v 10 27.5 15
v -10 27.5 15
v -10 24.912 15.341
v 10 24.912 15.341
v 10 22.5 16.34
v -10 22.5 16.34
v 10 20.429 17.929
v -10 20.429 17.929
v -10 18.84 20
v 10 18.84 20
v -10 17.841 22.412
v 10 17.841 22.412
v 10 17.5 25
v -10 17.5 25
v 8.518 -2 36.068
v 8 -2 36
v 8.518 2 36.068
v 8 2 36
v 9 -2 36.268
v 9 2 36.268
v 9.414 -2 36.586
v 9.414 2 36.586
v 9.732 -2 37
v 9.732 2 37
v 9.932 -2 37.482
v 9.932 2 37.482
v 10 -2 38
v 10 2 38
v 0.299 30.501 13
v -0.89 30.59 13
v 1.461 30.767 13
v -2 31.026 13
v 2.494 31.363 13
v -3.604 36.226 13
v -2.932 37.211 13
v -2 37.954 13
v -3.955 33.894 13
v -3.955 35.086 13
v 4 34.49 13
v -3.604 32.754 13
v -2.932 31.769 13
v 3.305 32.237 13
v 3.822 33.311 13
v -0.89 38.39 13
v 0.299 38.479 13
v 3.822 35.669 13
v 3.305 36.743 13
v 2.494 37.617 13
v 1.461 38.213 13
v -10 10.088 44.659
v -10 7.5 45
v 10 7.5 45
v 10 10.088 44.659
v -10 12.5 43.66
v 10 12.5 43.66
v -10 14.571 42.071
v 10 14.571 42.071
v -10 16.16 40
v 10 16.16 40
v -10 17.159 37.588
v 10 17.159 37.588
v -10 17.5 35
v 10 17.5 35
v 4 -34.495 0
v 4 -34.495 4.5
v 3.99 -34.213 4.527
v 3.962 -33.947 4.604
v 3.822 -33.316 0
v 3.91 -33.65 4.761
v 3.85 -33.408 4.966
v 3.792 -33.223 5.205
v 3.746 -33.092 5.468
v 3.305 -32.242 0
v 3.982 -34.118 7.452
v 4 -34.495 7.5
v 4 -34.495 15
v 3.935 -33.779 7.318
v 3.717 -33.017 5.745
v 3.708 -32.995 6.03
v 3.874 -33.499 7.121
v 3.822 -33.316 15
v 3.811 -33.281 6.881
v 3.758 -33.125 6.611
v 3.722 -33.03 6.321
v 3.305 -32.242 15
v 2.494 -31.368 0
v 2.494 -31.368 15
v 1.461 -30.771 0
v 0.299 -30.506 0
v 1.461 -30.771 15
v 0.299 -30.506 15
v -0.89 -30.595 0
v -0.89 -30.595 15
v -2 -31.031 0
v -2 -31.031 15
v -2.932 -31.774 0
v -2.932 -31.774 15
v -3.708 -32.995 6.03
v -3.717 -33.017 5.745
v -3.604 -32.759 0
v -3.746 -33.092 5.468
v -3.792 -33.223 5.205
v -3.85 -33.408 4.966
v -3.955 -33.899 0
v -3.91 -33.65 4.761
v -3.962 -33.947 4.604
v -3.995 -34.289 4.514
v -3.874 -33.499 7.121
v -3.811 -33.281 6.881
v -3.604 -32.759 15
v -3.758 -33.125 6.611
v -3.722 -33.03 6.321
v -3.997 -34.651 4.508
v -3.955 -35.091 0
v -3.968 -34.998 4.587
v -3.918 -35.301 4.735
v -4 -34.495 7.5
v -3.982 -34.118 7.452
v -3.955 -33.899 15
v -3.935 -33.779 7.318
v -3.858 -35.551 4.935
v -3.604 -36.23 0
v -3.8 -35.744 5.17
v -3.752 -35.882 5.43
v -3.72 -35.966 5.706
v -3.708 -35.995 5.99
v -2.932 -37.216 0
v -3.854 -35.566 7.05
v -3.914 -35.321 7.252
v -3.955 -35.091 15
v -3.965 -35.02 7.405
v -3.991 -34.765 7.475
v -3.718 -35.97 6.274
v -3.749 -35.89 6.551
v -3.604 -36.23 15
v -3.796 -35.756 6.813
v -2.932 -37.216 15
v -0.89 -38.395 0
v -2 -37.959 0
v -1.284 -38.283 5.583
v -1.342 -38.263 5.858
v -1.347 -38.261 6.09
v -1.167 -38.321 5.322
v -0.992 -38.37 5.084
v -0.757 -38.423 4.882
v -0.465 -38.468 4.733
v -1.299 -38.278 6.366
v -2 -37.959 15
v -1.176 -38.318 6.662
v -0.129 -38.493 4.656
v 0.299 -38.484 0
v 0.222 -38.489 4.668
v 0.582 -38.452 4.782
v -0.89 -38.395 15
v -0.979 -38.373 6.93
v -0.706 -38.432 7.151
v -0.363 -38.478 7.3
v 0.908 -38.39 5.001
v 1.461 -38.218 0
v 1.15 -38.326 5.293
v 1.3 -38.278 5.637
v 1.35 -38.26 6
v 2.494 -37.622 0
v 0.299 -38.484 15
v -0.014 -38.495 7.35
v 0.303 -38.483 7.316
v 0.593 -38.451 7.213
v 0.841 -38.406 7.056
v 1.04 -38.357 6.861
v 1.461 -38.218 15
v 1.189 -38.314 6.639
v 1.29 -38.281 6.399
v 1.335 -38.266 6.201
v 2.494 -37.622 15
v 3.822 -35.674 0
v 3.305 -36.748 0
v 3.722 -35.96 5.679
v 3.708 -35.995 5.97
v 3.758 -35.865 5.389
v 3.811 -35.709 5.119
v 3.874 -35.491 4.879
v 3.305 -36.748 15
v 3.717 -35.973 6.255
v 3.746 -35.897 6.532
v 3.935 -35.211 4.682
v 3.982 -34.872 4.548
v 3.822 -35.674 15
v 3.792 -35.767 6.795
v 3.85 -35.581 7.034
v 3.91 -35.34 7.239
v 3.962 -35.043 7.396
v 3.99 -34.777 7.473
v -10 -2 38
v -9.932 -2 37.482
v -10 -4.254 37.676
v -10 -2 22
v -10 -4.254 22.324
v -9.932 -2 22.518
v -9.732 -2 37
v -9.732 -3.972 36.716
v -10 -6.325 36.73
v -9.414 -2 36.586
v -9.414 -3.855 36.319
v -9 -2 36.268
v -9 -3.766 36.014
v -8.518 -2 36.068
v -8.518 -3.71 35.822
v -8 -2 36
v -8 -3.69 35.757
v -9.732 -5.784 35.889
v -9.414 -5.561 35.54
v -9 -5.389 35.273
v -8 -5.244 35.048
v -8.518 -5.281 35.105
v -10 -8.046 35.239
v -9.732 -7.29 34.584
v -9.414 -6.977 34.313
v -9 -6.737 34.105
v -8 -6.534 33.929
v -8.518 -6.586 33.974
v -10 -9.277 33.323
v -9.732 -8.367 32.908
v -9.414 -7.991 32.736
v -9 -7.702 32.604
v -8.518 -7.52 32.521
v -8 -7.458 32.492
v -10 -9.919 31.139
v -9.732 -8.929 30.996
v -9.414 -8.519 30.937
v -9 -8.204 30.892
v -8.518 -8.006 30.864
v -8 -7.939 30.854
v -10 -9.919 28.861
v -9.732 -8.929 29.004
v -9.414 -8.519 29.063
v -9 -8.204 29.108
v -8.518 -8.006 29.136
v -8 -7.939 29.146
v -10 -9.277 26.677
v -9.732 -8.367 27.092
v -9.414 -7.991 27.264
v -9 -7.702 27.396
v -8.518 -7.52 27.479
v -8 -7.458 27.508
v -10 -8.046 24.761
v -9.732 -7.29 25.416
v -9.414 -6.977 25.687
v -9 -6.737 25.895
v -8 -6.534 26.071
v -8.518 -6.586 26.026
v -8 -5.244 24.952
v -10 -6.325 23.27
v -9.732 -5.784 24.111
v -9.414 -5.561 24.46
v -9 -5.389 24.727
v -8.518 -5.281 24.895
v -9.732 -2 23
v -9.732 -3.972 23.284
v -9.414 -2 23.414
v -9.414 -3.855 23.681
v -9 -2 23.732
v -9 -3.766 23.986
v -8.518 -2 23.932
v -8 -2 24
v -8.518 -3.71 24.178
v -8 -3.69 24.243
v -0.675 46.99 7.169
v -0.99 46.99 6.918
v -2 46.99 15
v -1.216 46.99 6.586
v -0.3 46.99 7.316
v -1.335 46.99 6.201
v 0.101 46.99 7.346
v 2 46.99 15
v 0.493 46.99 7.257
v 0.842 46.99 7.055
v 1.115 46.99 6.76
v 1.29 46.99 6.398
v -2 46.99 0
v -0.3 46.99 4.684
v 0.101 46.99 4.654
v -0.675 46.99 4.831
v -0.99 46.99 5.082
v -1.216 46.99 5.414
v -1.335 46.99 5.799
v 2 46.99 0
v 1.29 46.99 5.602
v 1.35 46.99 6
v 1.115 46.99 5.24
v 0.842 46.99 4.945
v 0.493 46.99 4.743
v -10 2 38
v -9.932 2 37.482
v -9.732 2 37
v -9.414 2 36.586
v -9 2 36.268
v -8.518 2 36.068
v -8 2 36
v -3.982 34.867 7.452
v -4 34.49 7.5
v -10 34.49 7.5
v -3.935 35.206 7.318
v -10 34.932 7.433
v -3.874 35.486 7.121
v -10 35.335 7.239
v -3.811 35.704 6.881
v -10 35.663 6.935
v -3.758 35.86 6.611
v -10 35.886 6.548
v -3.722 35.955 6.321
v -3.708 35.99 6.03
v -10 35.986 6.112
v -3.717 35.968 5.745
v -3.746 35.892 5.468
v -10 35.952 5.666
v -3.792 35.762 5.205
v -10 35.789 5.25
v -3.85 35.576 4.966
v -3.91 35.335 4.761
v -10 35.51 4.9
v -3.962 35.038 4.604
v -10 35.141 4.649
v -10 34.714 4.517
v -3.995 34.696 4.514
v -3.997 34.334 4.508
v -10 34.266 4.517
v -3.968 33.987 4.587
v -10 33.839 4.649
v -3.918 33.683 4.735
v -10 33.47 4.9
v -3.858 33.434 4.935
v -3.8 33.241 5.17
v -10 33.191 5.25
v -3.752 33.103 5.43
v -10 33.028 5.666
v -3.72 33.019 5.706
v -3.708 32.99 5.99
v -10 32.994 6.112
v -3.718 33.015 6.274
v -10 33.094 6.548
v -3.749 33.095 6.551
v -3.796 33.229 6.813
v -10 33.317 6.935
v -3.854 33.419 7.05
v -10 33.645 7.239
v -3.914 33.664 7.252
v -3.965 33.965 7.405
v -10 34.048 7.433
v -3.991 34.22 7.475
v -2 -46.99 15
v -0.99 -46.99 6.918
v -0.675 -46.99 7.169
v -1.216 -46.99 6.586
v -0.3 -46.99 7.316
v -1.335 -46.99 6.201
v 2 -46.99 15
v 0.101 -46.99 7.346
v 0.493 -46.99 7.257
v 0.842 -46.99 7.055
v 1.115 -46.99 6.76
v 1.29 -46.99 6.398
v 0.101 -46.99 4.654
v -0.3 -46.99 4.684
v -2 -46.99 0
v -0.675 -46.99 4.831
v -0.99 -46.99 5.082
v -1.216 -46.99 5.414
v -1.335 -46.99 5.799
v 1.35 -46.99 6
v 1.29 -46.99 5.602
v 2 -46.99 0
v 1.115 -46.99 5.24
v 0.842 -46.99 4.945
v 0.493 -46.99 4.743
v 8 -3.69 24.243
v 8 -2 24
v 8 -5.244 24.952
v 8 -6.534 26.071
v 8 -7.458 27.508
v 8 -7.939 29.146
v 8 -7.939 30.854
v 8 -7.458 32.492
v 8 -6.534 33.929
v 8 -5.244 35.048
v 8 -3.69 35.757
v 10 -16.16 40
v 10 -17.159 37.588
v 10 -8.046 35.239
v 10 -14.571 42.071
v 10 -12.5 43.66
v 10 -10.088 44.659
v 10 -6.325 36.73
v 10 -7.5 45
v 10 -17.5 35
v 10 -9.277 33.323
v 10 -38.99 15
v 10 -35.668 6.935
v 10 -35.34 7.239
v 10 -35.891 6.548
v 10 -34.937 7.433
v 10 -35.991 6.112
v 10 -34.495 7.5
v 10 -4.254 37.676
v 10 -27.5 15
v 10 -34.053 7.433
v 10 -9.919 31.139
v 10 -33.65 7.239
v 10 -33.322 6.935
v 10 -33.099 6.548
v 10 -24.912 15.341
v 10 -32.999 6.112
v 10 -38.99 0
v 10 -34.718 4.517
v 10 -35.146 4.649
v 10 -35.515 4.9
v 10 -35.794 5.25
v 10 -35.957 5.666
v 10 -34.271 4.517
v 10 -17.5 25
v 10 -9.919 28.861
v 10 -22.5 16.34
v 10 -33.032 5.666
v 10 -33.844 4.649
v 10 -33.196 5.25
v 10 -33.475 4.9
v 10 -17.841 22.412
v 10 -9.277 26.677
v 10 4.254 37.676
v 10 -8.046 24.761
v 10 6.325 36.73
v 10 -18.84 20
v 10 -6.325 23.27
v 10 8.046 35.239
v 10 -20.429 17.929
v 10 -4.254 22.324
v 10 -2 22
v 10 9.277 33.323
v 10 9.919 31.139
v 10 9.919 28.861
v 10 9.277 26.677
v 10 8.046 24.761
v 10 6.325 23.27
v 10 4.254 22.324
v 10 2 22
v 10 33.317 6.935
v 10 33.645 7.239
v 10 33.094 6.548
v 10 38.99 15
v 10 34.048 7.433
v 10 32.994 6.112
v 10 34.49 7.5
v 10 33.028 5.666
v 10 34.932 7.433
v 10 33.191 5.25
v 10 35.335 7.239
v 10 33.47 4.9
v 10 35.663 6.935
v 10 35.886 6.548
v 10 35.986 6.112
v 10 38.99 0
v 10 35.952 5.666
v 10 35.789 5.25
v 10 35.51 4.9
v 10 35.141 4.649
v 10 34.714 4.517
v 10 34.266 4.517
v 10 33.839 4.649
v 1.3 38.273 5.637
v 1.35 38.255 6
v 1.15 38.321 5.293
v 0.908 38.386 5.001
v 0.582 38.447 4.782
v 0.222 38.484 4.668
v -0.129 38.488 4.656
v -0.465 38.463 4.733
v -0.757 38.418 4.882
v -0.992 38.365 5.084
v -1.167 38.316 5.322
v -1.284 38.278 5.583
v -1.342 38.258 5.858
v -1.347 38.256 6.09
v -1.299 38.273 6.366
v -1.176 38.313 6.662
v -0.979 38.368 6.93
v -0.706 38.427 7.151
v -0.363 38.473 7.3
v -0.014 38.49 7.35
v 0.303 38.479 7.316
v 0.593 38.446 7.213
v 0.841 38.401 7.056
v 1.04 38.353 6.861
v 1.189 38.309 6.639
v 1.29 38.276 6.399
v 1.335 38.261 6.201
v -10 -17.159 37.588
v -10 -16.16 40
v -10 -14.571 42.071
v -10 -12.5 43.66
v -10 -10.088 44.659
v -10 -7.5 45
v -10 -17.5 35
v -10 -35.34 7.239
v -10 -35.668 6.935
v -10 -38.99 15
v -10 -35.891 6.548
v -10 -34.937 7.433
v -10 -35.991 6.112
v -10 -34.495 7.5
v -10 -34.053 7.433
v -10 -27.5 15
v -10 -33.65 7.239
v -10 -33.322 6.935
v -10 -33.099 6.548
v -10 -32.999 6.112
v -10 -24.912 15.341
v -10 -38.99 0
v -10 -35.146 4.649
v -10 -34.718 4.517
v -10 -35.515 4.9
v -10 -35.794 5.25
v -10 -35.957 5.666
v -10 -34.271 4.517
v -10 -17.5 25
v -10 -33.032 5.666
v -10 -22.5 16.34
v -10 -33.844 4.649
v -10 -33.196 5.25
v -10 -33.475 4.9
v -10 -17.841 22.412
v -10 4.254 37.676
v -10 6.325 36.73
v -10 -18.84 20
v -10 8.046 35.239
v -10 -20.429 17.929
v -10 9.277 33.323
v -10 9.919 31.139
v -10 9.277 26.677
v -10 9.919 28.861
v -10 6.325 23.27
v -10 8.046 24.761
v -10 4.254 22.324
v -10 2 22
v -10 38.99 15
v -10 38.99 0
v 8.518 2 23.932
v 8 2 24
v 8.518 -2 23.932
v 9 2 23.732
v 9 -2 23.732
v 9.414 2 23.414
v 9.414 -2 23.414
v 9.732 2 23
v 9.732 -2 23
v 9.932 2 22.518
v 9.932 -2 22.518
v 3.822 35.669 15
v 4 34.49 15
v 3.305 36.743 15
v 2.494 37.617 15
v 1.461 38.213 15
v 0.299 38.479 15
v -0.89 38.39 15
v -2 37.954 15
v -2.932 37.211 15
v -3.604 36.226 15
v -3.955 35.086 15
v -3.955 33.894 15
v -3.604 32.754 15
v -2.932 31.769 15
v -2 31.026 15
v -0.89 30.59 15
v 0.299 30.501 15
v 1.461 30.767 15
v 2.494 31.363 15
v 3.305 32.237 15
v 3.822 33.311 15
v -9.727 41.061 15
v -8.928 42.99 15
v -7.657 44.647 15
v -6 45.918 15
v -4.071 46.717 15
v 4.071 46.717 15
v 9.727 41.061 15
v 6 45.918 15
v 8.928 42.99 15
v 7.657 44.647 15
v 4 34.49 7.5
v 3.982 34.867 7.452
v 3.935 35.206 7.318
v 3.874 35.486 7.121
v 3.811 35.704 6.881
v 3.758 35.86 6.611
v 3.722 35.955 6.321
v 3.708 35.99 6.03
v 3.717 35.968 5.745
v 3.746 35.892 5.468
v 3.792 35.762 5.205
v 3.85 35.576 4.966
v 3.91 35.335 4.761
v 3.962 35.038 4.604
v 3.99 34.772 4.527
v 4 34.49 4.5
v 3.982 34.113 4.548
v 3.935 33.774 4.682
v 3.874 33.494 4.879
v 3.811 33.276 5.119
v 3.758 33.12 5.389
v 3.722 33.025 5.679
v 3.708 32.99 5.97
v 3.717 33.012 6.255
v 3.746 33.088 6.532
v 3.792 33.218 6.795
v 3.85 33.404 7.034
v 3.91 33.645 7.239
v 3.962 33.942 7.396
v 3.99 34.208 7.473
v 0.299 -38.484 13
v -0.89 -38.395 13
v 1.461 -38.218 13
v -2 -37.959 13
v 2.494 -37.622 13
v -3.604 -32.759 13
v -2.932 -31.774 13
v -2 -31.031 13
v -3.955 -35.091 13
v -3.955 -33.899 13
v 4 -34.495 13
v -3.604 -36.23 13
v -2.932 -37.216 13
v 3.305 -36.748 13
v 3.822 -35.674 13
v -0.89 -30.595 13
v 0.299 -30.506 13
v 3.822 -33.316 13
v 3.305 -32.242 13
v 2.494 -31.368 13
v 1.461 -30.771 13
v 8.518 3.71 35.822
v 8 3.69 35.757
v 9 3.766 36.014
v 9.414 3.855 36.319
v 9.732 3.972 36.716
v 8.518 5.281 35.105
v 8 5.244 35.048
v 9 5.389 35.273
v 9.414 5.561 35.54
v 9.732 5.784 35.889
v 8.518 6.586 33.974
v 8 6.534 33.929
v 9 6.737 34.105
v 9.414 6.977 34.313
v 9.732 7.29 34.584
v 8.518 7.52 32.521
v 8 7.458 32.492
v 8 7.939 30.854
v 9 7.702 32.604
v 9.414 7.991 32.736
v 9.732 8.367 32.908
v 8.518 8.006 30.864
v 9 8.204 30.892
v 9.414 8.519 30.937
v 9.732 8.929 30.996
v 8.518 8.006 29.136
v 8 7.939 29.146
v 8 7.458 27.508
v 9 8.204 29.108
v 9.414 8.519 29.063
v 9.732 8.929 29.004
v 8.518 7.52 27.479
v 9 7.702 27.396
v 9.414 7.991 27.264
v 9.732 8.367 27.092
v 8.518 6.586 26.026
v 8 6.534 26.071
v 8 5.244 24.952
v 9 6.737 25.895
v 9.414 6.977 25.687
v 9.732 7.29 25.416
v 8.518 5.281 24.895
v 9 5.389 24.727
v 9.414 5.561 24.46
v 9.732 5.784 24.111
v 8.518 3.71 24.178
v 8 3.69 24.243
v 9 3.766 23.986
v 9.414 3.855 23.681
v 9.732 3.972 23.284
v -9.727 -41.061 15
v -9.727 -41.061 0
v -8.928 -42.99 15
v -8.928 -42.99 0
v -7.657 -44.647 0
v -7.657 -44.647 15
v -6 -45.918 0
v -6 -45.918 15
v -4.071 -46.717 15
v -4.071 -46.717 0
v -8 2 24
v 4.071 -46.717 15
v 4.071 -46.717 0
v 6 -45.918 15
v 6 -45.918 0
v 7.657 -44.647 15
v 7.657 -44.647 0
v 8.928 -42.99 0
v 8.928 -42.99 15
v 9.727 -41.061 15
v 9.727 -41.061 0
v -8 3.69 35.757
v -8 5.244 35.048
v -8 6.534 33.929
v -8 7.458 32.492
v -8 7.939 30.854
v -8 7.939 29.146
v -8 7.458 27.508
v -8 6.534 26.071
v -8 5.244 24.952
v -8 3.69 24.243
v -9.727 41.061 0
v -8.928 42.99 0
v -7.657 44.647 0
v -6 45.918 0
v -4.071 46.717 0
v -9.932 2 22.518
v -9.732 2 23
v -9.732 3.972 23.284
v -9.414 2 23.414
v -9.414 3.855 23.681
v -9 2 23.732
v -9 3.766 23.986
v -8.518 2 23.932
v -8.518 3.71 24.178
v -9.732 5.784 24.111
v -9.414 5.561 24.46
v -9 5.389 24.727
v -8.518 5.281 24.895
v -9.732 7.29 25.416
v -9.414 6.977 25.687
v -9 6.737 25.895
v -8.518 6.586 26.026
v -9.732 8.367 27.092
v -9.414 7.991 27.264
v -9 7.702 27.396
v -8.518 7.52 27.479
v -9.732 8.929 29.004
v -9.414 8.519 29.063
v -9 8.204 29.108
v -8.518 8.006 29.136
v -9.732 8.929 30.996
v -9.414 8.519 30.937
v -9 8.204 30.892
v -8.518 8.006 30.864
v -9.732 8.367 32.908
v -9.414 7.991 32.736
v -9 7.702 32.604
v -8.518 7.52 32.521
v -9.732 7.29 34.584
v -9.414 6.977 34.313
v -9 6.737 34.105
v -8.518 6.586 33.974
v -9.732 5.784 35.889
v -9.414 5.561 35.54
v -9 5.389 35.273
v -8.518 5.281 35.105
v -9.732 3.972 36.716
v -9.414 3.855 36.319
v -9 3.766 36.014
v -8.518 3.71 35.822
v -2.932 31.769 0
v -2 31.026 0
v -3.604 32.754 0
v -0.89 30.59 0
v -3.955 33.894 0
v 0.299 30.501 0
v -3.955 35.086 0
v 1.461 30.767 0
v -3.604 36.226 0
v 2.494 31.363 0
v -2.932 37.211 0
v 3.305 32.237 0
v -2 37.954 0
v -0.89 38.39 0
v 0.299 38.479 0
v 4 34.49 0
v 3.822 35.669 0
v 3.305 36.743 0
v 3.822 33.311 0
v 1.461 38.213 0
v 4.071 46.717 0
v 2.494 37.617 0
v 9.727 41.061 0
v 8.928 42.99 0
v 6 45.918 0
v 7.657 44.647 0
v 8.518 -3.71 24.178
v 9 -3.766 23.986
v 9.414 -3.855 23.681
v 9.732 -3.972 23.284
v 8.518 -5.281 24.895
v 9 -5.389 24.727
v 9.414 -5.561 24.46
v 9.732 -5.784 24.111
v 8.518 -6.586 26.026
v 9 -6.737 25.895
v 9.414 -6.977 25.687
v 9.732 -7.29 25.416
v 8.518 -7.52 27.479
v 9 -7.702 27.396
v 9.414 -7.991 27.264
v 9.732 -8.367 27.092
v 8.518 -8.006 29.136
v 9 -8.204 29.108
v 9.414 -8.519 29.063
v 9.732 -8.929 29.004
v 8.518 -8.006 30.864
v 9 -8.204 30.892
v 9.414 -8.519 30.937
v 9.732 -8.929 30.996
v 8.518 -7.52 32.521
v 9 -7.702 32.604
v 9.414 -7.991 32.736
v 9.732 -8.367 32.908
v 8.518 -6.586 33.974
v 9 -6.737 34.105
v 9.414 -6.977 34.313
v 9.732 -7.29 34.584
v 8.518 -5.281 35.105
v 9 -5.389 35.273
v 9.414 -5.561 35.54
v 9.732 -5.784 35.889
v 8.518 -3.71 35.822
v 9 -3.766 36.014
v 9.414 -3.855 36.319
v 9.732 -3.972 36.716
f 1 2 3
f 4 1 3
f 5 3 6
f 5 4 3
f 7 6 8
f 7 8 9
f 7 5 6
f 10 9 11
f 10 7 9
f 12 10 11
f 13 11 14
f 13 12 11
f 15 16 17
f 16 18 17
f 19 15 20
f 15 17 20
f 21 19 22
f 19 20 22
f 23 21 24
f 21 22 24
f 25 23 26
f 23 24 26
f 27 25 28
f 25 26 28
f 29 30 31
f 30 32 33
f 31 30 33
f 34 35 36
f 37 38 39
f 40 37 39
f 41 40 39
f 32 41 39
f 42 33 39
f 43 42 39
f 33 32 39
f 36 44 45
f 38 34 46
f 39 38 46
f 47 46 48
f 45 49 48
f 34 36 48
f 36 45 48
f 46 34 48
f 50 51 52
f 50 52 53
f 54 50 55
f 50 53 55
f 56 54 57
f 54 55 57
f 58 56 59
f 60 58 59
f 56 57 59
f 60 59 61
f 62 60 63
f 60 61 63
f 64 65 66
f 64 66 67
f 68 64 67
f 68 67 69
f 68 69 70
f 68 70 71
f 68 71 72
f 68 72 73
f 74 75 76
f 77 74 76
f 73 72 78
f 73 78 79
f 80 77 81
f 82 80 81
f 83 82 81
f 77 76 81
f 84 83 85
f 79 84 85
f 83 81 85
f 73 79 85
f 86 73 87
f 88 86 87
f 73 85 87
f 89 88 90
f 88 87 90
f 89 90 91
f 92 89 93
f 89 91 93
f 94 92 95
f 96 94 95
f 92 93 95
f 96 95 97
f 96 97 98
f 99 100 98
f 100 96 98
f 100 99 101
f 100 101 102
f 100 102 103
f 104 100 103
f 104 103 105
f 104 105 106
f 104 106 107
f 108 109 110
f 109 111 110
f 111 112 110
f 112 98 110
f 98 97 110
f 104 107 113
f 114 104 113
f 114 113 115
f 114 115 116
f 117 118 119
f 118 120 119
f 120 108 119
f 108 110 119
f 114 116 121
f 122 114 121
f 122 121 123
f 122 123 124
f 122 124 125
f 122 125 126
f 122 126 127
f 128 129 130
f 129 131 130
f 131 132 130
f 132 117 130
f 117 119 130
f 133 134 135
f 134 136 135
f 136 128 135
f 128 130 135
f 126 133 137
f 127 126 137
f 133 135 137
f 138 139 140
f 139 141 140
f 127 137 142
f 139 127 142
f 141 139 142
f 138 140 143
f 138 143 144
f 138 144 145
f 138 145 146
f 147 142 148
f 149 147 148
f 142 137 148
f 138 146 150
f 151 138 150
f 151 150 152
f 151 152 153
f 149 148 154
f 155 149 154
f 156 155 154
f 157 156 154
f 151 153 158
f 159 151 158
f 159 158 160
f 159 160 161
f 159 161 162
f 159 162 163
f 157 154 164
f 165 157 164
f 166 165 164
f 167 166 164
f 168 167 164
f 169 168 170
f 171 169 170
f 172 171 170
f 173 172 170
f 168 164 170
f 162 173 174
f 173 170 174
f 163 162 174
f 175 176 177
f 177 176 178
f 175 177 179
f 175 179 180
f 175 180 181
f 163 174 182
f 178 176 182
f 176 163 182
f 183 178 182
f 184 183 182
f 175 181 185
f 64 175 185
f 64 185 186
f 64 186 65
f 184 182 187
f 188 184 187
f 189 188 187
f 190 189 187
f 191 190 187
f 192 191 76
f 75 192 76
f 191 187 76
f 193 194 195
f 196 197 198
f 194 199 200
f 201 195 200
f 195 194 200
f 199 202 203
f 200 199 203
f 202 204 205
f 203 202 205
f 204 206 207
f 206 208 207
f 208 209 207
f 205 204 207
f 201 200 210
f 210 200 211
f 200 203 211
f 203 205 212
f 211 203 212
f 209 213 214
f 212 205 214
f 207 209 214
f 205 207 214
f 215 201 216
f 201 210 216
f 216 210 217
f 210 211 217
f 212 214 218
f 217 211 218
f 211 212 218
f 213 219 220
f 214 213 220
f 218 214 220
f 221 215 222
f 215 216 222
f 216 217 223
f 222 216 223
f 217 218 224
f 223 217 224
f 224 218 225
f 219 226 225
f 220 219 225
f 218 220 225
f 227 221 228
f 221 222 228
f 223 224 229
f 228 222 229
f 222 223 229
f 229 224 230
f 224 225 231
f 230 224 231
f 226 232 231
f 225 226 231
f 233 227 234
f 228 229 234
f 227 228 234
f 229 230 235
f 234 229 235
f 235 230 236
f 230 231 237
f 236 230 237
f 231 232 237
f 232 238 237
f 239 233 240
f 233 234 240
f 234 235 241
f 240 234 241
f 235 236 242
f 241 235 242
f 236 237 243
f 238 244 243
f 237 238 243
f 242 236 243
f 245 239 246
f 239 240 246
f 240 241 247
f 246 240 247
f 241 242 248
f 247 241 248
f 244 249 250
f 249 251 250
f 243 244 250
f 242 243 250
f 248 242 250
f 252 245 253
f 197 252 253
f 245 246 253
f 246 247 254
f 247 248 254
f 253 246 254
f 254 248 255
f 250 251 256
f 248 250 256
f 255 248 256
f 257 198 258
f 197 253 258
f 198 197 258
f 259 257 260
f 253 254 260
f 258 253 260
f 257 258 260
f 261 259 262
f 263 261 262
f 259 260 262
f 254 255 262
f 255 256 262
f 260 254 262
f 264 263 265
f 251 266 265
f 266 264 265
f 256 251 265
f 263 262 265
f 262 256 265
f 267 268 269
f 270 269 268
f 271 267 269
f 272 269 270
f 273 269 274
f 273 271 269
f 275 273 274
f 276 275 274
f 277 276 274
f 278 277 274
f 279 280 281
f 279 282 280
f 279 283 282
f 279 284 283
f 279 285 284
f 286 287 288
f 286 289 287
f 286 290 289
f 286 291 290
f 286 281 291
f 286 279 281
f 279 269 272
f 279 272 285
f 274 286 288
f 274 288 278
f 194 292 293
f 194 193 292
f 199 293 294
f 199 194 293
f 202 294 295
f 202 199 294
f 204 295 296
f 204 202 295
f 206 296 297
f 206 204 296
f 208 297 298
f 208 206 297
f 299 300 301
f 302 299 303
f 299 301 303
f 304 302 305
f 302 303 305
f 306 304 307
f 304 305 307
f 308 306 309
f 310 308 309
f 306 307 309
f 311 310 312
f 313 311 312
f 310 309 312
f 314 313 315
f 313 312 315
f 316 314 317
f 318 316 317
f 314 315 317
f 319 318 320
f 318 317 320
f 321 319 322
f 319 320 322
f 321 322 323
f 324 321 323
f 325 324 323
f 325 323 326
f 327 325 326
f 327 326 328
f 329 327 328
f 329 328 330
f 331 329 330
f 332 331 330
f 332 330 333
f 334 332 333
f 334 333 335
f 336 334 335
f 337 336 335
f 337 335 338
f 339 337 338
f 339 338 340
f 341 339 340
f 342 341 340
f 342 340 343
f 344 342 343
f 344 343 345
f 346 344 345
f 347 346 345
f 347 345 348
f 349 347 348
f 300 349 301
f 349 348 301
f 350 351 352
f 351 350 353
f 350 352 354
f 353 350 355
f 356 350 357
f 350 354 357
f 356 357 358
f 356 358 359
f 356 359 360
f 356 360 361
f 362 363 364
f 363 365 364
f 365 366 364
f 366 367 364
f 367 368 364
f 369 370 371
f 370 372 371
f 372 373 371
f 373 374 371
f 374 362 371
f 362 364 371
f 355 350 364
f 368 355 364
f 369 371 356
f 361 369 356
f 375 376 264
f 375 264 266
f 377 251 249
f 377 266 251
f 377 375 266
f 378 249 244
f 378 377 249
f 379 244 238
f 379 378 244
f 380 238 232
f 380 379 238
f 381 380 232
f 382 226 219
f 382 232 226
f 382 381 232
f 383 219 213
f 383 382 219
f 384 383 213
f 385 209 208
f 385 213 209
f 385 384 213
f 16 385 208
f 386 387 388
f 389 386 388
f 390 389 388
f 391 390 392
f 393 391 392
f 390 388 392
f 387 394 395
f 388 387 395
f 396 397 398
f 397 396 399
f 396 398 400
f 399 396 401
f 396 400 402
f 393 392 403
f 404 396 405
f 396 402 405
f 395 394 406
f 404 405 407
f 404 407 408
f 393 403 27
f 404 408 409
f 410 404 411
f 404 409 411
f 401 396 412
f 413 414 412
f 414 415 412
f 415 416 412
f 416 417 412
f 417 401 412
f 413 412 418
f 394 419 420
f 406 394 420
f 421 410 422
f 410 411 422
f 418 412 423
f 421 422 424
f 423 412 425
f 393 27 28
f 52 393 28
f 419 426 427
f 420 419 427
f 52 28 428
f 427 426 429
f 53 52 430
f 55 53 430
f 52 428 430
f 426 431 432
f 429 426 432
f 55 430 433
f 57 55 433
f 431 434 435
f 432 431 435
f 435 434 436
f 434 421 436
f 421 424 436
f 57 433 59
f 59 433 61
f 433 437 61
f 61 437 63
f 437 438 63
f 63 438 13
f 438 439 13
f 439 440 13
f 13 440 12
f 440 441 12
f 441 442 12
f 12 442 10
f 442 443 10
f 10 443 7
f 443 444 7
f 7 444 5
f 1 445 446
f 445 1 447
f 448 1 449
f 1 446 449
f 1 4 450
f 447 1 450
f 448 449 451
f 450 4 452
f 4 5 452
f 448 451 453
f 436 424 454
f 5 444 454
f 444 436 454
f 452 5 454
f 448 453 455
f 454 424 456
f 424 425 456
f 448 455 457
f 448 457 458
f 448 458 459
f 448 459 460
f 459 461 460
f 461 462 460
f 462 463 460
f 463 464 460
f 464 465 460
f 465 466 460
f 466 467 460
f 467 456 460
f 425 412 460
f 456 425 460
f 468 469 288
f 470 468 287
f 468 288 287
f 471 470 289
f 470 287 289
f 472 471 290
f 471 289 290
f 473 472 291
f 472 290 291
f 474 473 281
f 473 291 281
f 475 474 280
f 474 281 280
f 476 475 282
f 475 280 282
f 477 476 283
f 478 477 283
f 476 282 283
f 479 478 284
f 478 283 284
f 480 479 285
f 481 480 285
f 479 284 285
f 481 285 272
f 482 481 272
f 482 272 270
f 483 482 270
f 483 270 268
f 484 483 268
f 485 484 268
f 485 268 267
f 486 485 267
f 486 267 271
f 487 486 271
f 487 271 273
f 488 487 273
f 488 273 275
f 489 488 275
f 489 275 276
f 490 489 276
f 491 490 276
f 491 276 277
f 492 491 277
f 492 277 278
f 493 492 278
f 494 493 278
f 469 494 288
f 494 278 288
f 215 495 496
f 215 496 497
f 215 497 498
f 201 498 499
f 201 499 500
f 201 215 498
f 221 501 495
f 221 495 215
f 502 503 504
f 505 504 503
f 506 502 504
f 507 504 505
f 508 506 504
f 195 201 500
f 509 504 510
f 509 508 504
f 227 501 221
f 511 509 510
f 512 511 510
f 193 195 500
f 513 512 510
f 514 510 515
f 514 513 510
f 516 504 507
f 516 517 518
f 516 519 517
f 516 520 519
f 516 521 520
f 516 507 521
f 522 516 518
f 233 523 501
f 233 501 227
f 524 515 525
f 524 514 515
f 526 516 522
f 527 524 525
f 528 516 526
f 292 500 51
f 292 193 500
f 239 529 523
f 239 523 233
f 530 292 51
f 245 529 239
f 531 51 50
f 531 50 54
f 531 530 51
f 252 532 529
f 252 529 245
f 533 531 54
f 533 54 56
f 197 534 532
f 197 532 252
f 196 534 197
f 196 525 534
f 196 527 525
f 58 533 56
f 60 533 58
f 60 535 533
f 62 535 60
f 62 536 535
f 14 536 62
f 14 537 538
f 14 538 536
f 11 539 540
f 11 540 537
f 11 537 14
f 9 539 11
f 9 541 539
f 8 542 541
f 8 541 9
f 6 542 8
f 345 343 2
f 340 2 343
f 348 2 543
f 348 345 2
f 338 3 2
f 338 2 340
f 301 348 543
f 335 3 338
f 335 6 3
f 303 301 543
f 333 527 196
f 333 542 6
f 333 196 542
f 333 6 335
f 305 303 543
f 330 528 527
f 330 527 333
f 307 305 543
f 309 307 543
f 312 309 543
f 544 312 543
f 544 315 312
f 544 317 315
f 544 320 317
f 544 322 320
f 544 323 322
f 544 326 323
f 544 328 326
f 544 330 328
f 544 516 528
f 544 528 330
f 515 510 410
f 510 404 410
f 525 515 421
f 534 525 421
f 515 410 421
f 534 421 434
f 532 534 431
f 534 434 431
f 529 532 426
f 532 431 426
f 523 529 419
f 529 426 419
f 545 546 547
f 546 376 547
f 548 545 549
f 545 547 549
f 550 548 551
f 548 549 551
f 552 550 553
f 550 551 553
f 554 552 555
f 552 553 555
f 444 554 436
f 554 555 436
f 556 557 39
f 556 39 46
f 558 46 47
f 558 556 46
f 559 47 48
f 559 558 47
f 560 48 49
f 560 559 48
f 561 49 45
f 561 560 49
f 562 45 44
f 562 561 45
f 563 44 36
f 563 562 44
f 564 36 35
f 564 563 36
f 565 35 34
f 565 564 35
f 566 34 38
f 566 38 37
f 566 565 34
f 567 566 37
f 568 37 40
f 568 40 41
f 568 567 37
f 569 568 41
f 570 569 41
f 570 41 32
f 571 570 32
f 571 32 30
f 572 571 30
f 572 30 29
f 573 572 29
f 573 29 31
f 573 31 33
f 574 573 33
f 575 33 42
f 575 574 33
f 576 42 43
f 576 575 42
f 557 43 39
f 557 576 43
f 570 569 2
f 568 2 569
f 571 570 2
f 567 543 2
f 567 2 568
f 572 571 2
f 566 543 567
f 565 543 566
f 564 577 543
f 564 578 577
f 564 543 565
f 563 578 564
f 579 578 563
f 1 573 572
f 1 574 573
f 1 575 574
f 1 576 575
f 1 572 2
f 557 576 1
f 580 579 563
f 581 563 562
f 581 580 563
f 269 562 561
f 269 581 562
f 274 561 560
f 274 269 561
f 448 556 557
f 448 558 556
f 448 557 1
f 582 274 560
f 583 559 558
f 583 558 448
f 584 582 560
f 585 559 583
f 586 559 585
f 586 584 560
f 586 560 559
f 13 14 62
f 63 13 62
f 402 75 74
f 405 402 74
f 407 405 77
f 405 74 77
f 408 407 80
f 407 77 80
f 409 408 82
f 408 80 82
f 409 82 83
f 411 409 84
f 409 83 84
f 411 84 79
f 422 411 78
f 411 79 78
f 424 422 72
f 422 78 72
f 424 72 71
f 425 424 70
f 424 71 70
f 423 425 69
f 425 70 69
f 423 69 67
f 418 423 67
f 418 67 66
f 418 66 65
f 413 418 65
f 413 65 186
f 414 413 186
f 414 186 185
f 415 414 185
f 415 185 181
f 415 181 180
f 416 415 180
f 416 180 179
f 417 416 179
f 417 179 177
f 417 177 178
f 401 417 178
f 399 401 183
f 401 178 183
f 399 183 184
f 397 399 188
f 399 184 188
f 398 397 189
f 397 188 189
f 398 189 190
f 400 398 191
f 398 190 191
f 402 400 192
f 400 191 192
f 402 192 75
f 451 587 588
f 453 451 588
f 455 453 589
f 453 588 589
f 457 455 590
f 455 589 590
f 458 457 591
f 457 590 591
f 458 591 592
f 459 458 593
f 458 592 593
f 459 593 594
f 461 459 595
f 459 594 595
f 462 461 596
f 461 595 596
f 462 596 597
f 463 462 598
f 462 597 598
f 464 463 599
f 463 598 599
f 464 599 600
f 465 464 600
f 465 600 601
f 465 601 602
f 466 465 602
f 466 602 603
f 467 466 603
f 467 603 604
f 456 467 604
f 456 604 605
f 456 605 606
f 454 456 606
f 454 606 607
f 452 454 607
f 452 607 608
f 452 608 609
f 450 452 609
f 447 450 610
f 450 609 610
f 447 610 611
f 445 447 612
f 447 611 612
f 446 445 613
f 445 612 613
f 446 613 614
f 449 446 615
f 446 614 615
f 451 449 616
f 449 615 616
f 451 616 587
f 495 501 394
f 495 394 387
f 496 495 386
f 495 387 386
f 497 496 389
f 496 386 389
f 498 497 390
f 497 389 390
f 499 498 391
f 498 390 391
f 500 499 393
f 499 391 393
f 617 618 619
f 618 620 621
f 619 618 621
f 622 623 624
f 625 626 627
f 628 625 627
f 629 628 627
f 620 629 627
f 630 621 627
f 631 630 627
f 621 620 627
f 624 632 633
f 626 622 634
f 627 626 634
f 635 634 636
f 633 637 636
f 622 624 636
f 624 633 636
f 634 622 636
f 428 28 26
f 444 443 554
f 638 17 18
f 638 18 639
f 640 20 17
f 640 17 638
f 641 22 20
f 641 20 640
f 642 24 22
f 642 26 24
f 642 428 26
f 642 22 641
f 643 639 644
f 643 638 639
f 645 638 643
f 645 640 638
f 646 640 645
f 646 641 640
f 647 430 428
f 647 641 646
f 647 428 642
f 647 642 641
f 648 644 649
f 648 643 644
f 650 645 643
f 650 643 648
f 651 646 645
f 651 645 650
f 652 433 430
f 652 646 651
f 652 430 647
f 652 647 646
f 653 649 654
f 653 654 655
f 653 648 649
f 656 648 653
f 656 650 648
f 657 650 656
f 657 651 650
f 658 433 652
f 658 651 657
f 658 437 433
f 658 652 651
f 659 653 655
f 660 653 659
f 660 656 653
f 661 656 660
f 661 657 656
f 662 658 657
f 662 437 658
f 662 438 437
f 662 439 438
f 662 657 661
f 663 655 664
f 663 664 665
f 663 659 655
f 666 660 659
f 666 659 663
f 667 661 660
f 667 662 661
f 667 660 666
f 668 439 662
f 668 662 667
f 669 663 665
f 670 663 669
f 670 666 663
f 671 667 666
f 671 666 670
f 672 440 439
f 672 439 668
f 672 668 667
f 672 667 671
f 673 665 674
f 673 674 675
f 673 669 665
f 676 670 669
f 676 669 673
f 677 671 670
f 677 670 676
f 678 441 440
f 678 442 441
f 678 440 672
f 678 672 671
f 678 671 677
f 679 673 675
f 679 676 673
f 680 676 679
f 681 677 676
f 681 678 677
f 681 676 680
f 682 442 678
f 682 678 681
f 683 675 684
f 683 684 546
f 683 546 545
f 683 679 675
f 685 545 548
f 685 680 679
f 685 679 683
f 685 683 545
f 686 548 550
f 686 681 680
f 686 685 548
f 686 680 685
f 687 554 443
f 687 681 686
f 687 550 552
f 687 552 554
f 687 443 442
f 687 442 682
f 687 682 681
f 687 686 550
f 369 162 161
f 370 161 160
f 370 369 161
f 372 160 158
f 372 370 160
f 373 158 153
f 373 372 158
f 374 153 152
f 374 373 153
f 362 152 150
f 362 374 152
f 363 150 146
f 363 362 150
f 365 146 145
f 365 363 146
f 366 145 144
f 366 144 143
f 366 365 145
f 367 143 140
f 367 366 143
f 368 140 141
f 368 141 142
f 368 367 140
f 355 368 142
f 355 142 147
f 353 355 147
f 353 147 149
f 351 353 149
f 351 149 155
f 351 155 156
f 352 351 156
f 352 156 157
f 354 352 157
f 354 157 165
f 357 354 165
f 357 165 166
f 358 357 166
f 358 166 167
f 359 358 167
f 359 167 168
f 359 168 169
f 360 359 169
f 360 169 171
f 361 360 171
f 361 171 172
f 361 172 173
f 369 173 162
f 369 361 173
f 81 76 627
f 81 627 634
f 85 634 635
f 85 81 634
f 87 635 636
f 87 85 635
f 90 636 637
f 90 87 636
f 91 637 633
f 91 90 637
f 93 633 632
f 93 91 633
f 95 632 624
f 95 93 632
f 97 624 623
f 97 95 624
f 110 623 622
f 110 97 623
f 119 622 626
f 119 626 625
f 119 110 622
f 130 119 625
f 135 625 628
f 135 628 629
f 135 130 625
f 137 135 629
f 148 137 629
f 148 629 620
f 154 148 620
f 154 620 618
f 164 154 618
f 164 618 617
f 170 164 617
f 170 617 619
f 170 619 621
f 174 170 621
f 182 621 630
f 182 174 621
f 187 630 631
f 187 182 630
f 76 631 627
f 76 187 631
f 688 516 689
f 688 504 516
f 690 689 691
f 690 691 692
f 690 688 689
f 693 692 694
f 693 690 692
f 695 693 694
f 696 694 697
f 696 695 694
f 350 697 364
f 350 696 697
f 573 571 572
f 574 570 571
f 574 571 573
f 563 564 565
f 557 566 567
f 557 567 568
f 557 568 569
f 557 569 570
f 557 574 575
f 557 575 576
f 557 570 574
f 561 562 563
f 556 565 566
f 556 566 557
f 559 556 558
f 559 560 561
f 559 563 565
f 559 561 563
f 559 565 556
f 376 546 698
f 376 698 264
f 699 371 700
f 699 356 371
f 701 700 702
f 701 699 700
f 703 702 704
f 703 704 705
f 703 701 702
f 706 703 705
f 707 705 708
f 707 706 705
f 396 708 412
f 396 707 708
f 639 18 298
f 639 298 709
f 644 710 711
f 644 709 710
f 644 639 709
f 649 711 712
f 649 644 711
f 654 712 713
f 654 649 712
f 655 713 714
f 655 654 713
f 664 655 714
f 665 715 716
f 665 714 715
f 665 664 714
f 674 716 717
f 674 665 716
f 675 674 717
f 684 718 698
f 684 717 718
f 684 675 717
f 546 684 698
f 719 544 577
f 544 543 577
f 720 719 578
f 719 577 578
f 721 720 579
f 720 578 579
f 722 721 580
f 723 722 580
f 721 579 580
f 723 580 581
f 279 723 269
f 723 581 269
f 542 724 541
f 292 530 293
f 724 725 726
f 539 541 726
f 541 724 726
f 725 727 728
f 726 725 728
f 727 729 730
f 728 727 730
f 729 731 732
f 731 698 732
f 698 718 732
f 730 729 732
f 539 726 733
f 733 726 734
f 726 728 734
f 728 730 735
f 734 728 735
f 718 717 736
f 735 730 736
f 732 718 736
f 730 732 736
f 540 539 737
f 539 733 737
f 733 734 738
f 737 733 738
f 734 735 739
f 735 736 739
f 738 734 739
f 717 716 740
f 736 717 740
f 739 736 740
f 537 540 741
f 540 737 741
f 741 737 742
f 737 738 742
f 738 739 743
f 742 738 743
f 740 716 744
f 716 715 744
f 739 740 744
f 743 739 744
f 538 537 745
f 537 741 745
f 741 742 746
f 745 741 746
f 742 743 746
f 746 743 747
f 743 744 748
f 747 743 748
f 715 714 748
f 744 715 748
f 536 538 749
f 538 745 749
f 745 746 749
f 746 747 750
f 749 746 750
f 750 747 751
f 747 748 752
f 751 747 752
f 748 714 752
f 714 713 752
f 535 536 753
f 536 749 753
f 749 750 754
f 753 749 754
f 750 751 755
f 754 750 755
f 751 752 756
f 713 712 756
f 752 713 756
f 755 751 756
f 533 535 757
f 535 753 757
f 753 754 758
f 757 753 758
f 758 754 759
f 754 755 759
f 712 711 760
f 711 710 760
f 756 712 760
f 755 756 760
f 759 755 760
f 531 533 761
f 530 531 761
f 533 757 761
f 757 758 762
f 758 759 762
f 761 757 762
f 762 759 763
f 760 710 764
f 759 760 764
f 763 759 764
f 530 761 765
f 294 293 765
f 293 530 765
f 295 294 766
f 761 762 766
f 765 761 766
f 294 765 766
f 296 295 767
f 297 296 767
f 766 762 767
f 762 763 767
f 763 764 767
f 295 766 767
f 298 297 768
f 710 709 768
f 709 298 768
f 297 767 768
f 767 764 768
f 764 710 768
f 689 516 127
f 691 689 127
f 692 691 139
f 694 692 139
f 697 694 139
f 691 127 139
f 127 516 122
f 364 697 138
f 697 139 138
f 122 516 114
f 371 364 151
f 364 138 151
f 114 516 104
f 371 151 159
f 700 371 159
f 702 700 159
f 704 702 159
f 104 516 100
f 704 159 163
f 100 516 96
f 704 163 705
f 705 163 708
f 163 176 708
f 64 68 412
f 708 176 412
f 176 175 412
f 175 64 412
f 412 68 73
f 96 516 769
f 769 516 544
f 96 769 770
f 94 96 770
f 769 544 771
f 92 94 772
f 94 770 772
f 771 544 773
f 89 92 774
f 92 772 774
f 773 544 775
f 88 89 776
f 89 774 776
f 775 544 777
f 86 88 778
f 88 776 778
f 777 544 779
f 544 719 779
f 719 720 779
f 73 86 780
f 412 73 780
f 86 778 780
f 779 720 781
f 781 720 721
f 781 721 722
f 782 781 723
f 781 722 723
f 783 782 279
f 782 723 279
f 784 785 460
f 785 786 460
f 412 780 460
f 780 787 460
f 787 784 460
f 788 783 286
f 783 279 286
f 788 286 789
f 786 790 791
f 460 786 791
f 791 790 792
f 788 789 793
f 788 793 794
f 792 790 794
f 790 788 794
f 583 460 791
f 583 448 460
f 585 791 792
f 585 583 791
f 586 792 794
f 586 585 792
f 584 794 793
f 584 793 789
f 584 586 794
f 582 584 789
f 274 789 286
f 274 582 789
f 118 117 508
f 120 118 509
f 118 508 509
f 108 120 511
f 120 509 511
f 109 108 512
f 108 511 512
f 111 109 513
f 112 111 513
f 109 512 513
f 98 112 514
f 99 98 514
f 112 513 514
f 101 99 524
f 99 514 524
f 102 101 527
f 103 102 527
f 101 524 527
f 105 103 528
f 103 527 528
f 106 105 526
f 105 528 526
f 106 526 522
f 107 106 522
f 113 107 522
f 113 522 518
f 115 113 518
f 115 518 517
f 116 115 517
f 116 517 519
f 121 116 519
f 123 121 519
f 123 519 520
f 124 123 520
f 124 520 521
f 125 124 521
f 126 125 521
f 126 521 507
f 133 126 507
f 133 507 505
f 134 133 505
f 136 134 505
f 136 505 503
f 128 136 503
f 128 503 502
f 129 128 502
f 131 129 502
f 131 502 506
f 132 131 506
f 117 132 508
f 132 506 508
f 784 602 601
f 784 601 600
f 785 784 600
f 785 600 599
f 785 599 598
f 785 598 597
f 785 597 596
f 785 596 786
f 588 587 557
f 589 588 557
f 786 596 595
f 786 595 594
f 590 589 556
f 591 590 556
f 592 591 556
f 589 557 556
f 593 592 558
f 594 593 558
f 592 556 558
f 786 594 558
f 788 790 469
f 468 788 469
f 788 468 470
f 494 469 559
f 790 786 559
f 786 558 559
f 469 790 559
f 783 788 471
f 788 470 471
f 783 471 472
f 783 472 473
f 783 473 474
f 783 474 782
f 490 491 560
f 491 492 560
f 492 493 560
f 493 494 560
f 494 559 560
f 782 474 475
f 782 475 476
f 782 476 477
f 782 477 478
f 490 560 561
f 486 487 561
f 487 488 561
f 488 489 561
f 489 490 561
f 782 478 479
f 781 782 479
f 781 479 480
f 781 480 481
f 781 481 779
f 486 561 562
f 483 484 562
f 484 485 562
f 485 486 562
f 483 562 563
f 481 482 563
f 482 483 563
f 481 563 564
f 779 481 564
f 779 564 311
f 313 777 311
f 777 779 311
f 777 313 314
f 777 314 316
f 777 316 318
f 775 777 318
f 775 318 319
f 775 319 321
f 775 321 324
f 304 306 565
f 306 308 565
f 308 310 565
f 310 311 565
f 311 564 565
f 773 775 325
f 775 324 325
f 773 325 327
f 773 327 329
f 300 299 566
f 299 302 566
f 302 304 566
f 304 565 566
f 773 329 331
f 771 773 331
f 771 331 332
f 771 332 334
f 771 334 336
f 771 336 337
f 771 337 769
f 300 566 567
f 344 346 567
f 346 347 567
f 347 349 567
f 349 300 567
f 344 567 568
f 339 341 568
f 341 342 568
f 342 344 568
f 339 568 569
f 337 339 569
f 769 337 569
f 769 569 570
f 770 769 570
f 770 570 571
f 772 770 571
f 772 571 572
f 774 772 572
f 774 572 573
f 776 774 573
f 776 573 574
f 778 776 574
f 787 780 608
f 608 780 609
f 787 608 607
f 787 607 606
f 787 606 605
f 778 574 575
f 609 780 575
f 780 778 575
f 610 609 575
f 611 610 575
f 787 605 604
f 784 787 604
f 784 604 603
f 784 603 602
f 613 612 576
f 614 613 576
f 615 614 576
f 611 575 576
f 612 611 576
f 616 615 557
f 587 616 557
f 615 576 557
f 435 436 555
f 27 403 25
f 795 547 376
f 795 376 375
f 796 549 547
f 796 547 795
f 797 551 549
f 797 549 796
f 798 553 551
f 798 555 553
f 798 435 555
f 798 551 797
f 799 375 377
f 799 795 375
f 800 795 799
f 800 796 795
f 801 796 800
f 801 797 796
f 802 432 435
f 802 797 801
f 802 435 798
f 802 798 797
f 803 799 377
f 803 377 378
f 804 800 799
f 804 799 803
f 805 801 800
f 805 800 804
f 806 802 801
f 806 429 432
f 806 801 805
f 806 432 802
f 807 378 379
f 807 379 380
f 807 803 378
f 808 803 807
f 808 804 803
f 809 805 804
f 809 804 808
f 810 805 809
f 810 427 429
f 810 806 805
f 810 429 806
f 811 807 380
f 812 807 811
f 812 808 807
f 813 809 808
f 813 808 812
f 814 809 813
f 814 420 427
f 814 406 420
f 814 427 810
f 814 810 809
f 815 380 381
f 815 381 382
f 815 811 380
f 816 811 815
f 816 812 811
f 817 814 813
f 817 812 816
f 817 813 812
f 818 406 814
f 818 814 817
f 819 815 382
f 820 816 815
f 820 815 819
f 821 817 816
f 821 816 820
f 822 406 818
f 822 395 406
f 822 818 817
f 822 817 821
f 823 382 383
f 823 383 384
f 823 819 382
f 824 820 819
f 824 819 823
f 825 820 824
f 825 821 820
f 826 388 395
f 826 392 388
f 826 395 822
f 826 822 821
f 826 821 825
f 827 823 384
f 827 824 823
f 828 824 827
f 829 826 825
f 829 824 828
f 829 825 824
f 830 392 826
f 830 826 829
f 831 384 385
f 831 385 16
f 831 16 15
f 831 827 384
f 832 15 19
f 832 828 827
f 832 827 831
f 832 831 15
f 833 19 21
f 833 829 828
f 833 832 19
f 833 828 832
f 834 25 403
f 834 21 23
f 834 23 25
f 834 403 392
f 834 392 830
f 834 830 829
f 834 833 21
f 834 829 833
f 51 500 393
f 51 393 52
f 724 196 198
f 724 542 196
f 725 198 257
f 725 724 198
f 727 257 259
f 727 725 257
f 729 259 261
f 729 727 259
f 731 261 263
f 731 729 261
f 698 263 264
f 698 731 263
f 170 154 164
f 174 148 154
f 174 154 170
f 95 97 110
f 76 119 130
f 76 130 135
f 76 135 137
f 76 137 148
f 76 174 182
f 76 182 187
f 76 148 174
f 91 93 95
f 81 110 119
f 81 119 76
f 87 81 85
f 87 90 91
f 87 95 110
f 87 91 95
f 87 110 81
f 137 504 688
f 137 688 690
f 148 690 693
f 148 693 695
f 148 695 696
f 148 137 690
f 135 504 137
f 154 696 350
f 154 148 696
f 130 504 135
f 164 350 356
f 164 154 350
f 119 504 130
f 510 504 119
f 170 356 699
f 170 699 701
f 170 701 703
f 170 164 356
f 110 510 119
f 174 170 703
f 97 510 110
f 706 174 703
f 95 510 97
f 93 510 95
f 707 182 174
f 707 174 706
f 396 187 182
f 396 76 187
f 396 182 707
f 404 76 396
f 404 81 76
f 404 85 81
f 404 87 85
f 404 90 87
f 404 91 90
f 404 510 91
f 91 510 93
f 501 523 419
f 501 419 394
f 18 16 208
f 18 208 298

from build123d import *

# Parameters (mm, degrees)
SKETCH1_W             = 20
SKETCH1_H             = 93.98
BOSS_EXTRUDE1_DEPTH   = 15
FILLET1_R             = 8
SKETCH2_R             = 4
CUT_EXTRUDE1_DEPTH    = 16
SKETCH3_R             = 1.5
CUT_EXTRUDE2_DEPTH    = 21
SKETCH4_W             = 30
SKETCH4_H             = 35
BOSS_EXTRUDE2_DEPTH   = 20
FILLET2_R             = 10
CUT_EXTRUDE3_DEPTH    = 21.0000001
FILLET3_R             = 2
SKETCH6_R             = 1.35
CUT_EXTRUDE4_DEPTH    = 10
SKETCH7_R             = 4
BOSS_EXTRUDE3_DEPTH   = 2
BOSS_EXTRUDE3_2_DEPTH = 2


with BuildPart() as part:
    # Sketch1 → Boss-Extrude1 (new body)
    with BuildSketch(Plane.XY):
        Rectangle(SKETCH1_W, SKETCH1_H)
    extrude(amount=BOSS_EXTRUDE1_DEPTH)

    # Fillet1
    fillet1_edges = [part.edges().sort_by_distance(p)[0] for p in [
        (10, -46.99, 7.5),
        (-10, -46.99, 7.5),
        (-10, 46.99, 7.5),
        (10, 46.99, 7.5),
    ]]
    fillet(fillet1_edges, radius=FILLET1_R)

    # Sketch2 → Cut-Extrude1 (cut, through all)
    with BuildSketch(Plane.XY.offset(15)):
        with Locations((0, 34.49)):
            Circle(SKETCH2_R)
        with Locations((0, -34.494880812)):
            Circle(SKETCH2_R)
    extrude(amount=-CUT_EXTRUDE1_DEPTH, mode=Mode.SUBTRACT)

    # Sketch3 → Cut-Extrude2 (cut, through all)
    with BuildSketch(Plane.ZY.offset(10)):
        with Locations((6, 34.49)):
            Circle(SKETCH3_R)
        with Locations((6, -34.494880812)):
            Circle(SKETCH3_R)
    extrude(amount=-CUT_EXTRUDE2_DEPTH, mode=Mode.SUBTRACT)

    # Sketch4 → Boss-Extrude2 (add)
    with BuildSketch(Plane.ZY.offset(10)):
        with Locations((30, 0)):
            Rectangle(SKETCH4_W, SKETCH4_H)
    extrude(amount=-BOSS_EXTRUDE2_DEPTH)

    # Fillet2
    fillet2_edges = [part.edges().sort_by_distance(p)[0] for p in [
        (0, -17.5, 15),
        (0, 17.5, 15),
        (0, 17.5, 45),
        (0, -17.5, 45),
    ]]
    fillet(fillet2_edges, radius=FILLET2_R)

    # Sketch5 → Cut-Extrude3 (cut, through all)
    with BuildSketch(Plane(origin=(10, 0, 0), x_dir=(0, 0, -1), z_dir=(1, 0, 0))):
        with BuildLine():
            Line((-24, 2), (-24, -2))
            ThreePointArc((-24, -2), (-30, -8), (-36, -2))
            Line((-36, -2), (-36, 2))
            ThreePointArc((-36, 2), (-30, 8), (-24, 2))
        make_face()
    extrude(amount=-CUT_EXTRUDE3_DEPTH, mode=Mode.SUBTRACT)

    # Fillet3
    fillet3_edges = [part.edges().sort_by_distance(p)[0] for p in [
        (-10, 8, 30),
        (-10, 0, 24),
        (-10, -8, 30),
        (-10, 0, 36),
        (10, 8, 30),
        (10, 0, 36),
        (10, -8, 30),
        (10, 0, 24),
    ]]
    fillet(fillet3_edges, radius=FILLET3_R)

    # Sketch6 → Cut-Extrude4 (cut)
    with BuildSketch(Plane(origin=(0, 46.99, 0), x_dir=(1, 0, 0), z_dir=(0, 1, 0))):
        with Locations((0, -6)):
            Circle(SKETCH6_R)
    cut_extrude4 = extrude(amount=-CUT_EXTRUDE4_DEPTH, mode=Mode.SUBTRACT)

    # Mirror1: Cut-Extrude4 across plane
    add(cut_extrude4.mirror(Plane.ZX), mode=Mode.SUBTRACT)


with BuildPart() as body_2:
    # Sketch7 → Boss-Extrude3 (new body)
    with BuildSketch(Plane.XY.offset(15)):
        with Locations((0, 34.49)):
            Circle(SKETCH7_R)
    extrude(amount=-BOSS_EXTRUDE3_DEPTH)


with BuildPart() as body_3:
    # Sketch7 → Boss-Extrude3 2 (new body)
    with BuildSketch(Plane.XY.offset(15)):
        with Locations((0, -34.494880812)):
            Circle(SKETCH7_R)
    extrude(amount=-BOSS_EXTRUDE3_2_DEPTH)


solid = Compound([part.part, body_2.part, body_3.part])
